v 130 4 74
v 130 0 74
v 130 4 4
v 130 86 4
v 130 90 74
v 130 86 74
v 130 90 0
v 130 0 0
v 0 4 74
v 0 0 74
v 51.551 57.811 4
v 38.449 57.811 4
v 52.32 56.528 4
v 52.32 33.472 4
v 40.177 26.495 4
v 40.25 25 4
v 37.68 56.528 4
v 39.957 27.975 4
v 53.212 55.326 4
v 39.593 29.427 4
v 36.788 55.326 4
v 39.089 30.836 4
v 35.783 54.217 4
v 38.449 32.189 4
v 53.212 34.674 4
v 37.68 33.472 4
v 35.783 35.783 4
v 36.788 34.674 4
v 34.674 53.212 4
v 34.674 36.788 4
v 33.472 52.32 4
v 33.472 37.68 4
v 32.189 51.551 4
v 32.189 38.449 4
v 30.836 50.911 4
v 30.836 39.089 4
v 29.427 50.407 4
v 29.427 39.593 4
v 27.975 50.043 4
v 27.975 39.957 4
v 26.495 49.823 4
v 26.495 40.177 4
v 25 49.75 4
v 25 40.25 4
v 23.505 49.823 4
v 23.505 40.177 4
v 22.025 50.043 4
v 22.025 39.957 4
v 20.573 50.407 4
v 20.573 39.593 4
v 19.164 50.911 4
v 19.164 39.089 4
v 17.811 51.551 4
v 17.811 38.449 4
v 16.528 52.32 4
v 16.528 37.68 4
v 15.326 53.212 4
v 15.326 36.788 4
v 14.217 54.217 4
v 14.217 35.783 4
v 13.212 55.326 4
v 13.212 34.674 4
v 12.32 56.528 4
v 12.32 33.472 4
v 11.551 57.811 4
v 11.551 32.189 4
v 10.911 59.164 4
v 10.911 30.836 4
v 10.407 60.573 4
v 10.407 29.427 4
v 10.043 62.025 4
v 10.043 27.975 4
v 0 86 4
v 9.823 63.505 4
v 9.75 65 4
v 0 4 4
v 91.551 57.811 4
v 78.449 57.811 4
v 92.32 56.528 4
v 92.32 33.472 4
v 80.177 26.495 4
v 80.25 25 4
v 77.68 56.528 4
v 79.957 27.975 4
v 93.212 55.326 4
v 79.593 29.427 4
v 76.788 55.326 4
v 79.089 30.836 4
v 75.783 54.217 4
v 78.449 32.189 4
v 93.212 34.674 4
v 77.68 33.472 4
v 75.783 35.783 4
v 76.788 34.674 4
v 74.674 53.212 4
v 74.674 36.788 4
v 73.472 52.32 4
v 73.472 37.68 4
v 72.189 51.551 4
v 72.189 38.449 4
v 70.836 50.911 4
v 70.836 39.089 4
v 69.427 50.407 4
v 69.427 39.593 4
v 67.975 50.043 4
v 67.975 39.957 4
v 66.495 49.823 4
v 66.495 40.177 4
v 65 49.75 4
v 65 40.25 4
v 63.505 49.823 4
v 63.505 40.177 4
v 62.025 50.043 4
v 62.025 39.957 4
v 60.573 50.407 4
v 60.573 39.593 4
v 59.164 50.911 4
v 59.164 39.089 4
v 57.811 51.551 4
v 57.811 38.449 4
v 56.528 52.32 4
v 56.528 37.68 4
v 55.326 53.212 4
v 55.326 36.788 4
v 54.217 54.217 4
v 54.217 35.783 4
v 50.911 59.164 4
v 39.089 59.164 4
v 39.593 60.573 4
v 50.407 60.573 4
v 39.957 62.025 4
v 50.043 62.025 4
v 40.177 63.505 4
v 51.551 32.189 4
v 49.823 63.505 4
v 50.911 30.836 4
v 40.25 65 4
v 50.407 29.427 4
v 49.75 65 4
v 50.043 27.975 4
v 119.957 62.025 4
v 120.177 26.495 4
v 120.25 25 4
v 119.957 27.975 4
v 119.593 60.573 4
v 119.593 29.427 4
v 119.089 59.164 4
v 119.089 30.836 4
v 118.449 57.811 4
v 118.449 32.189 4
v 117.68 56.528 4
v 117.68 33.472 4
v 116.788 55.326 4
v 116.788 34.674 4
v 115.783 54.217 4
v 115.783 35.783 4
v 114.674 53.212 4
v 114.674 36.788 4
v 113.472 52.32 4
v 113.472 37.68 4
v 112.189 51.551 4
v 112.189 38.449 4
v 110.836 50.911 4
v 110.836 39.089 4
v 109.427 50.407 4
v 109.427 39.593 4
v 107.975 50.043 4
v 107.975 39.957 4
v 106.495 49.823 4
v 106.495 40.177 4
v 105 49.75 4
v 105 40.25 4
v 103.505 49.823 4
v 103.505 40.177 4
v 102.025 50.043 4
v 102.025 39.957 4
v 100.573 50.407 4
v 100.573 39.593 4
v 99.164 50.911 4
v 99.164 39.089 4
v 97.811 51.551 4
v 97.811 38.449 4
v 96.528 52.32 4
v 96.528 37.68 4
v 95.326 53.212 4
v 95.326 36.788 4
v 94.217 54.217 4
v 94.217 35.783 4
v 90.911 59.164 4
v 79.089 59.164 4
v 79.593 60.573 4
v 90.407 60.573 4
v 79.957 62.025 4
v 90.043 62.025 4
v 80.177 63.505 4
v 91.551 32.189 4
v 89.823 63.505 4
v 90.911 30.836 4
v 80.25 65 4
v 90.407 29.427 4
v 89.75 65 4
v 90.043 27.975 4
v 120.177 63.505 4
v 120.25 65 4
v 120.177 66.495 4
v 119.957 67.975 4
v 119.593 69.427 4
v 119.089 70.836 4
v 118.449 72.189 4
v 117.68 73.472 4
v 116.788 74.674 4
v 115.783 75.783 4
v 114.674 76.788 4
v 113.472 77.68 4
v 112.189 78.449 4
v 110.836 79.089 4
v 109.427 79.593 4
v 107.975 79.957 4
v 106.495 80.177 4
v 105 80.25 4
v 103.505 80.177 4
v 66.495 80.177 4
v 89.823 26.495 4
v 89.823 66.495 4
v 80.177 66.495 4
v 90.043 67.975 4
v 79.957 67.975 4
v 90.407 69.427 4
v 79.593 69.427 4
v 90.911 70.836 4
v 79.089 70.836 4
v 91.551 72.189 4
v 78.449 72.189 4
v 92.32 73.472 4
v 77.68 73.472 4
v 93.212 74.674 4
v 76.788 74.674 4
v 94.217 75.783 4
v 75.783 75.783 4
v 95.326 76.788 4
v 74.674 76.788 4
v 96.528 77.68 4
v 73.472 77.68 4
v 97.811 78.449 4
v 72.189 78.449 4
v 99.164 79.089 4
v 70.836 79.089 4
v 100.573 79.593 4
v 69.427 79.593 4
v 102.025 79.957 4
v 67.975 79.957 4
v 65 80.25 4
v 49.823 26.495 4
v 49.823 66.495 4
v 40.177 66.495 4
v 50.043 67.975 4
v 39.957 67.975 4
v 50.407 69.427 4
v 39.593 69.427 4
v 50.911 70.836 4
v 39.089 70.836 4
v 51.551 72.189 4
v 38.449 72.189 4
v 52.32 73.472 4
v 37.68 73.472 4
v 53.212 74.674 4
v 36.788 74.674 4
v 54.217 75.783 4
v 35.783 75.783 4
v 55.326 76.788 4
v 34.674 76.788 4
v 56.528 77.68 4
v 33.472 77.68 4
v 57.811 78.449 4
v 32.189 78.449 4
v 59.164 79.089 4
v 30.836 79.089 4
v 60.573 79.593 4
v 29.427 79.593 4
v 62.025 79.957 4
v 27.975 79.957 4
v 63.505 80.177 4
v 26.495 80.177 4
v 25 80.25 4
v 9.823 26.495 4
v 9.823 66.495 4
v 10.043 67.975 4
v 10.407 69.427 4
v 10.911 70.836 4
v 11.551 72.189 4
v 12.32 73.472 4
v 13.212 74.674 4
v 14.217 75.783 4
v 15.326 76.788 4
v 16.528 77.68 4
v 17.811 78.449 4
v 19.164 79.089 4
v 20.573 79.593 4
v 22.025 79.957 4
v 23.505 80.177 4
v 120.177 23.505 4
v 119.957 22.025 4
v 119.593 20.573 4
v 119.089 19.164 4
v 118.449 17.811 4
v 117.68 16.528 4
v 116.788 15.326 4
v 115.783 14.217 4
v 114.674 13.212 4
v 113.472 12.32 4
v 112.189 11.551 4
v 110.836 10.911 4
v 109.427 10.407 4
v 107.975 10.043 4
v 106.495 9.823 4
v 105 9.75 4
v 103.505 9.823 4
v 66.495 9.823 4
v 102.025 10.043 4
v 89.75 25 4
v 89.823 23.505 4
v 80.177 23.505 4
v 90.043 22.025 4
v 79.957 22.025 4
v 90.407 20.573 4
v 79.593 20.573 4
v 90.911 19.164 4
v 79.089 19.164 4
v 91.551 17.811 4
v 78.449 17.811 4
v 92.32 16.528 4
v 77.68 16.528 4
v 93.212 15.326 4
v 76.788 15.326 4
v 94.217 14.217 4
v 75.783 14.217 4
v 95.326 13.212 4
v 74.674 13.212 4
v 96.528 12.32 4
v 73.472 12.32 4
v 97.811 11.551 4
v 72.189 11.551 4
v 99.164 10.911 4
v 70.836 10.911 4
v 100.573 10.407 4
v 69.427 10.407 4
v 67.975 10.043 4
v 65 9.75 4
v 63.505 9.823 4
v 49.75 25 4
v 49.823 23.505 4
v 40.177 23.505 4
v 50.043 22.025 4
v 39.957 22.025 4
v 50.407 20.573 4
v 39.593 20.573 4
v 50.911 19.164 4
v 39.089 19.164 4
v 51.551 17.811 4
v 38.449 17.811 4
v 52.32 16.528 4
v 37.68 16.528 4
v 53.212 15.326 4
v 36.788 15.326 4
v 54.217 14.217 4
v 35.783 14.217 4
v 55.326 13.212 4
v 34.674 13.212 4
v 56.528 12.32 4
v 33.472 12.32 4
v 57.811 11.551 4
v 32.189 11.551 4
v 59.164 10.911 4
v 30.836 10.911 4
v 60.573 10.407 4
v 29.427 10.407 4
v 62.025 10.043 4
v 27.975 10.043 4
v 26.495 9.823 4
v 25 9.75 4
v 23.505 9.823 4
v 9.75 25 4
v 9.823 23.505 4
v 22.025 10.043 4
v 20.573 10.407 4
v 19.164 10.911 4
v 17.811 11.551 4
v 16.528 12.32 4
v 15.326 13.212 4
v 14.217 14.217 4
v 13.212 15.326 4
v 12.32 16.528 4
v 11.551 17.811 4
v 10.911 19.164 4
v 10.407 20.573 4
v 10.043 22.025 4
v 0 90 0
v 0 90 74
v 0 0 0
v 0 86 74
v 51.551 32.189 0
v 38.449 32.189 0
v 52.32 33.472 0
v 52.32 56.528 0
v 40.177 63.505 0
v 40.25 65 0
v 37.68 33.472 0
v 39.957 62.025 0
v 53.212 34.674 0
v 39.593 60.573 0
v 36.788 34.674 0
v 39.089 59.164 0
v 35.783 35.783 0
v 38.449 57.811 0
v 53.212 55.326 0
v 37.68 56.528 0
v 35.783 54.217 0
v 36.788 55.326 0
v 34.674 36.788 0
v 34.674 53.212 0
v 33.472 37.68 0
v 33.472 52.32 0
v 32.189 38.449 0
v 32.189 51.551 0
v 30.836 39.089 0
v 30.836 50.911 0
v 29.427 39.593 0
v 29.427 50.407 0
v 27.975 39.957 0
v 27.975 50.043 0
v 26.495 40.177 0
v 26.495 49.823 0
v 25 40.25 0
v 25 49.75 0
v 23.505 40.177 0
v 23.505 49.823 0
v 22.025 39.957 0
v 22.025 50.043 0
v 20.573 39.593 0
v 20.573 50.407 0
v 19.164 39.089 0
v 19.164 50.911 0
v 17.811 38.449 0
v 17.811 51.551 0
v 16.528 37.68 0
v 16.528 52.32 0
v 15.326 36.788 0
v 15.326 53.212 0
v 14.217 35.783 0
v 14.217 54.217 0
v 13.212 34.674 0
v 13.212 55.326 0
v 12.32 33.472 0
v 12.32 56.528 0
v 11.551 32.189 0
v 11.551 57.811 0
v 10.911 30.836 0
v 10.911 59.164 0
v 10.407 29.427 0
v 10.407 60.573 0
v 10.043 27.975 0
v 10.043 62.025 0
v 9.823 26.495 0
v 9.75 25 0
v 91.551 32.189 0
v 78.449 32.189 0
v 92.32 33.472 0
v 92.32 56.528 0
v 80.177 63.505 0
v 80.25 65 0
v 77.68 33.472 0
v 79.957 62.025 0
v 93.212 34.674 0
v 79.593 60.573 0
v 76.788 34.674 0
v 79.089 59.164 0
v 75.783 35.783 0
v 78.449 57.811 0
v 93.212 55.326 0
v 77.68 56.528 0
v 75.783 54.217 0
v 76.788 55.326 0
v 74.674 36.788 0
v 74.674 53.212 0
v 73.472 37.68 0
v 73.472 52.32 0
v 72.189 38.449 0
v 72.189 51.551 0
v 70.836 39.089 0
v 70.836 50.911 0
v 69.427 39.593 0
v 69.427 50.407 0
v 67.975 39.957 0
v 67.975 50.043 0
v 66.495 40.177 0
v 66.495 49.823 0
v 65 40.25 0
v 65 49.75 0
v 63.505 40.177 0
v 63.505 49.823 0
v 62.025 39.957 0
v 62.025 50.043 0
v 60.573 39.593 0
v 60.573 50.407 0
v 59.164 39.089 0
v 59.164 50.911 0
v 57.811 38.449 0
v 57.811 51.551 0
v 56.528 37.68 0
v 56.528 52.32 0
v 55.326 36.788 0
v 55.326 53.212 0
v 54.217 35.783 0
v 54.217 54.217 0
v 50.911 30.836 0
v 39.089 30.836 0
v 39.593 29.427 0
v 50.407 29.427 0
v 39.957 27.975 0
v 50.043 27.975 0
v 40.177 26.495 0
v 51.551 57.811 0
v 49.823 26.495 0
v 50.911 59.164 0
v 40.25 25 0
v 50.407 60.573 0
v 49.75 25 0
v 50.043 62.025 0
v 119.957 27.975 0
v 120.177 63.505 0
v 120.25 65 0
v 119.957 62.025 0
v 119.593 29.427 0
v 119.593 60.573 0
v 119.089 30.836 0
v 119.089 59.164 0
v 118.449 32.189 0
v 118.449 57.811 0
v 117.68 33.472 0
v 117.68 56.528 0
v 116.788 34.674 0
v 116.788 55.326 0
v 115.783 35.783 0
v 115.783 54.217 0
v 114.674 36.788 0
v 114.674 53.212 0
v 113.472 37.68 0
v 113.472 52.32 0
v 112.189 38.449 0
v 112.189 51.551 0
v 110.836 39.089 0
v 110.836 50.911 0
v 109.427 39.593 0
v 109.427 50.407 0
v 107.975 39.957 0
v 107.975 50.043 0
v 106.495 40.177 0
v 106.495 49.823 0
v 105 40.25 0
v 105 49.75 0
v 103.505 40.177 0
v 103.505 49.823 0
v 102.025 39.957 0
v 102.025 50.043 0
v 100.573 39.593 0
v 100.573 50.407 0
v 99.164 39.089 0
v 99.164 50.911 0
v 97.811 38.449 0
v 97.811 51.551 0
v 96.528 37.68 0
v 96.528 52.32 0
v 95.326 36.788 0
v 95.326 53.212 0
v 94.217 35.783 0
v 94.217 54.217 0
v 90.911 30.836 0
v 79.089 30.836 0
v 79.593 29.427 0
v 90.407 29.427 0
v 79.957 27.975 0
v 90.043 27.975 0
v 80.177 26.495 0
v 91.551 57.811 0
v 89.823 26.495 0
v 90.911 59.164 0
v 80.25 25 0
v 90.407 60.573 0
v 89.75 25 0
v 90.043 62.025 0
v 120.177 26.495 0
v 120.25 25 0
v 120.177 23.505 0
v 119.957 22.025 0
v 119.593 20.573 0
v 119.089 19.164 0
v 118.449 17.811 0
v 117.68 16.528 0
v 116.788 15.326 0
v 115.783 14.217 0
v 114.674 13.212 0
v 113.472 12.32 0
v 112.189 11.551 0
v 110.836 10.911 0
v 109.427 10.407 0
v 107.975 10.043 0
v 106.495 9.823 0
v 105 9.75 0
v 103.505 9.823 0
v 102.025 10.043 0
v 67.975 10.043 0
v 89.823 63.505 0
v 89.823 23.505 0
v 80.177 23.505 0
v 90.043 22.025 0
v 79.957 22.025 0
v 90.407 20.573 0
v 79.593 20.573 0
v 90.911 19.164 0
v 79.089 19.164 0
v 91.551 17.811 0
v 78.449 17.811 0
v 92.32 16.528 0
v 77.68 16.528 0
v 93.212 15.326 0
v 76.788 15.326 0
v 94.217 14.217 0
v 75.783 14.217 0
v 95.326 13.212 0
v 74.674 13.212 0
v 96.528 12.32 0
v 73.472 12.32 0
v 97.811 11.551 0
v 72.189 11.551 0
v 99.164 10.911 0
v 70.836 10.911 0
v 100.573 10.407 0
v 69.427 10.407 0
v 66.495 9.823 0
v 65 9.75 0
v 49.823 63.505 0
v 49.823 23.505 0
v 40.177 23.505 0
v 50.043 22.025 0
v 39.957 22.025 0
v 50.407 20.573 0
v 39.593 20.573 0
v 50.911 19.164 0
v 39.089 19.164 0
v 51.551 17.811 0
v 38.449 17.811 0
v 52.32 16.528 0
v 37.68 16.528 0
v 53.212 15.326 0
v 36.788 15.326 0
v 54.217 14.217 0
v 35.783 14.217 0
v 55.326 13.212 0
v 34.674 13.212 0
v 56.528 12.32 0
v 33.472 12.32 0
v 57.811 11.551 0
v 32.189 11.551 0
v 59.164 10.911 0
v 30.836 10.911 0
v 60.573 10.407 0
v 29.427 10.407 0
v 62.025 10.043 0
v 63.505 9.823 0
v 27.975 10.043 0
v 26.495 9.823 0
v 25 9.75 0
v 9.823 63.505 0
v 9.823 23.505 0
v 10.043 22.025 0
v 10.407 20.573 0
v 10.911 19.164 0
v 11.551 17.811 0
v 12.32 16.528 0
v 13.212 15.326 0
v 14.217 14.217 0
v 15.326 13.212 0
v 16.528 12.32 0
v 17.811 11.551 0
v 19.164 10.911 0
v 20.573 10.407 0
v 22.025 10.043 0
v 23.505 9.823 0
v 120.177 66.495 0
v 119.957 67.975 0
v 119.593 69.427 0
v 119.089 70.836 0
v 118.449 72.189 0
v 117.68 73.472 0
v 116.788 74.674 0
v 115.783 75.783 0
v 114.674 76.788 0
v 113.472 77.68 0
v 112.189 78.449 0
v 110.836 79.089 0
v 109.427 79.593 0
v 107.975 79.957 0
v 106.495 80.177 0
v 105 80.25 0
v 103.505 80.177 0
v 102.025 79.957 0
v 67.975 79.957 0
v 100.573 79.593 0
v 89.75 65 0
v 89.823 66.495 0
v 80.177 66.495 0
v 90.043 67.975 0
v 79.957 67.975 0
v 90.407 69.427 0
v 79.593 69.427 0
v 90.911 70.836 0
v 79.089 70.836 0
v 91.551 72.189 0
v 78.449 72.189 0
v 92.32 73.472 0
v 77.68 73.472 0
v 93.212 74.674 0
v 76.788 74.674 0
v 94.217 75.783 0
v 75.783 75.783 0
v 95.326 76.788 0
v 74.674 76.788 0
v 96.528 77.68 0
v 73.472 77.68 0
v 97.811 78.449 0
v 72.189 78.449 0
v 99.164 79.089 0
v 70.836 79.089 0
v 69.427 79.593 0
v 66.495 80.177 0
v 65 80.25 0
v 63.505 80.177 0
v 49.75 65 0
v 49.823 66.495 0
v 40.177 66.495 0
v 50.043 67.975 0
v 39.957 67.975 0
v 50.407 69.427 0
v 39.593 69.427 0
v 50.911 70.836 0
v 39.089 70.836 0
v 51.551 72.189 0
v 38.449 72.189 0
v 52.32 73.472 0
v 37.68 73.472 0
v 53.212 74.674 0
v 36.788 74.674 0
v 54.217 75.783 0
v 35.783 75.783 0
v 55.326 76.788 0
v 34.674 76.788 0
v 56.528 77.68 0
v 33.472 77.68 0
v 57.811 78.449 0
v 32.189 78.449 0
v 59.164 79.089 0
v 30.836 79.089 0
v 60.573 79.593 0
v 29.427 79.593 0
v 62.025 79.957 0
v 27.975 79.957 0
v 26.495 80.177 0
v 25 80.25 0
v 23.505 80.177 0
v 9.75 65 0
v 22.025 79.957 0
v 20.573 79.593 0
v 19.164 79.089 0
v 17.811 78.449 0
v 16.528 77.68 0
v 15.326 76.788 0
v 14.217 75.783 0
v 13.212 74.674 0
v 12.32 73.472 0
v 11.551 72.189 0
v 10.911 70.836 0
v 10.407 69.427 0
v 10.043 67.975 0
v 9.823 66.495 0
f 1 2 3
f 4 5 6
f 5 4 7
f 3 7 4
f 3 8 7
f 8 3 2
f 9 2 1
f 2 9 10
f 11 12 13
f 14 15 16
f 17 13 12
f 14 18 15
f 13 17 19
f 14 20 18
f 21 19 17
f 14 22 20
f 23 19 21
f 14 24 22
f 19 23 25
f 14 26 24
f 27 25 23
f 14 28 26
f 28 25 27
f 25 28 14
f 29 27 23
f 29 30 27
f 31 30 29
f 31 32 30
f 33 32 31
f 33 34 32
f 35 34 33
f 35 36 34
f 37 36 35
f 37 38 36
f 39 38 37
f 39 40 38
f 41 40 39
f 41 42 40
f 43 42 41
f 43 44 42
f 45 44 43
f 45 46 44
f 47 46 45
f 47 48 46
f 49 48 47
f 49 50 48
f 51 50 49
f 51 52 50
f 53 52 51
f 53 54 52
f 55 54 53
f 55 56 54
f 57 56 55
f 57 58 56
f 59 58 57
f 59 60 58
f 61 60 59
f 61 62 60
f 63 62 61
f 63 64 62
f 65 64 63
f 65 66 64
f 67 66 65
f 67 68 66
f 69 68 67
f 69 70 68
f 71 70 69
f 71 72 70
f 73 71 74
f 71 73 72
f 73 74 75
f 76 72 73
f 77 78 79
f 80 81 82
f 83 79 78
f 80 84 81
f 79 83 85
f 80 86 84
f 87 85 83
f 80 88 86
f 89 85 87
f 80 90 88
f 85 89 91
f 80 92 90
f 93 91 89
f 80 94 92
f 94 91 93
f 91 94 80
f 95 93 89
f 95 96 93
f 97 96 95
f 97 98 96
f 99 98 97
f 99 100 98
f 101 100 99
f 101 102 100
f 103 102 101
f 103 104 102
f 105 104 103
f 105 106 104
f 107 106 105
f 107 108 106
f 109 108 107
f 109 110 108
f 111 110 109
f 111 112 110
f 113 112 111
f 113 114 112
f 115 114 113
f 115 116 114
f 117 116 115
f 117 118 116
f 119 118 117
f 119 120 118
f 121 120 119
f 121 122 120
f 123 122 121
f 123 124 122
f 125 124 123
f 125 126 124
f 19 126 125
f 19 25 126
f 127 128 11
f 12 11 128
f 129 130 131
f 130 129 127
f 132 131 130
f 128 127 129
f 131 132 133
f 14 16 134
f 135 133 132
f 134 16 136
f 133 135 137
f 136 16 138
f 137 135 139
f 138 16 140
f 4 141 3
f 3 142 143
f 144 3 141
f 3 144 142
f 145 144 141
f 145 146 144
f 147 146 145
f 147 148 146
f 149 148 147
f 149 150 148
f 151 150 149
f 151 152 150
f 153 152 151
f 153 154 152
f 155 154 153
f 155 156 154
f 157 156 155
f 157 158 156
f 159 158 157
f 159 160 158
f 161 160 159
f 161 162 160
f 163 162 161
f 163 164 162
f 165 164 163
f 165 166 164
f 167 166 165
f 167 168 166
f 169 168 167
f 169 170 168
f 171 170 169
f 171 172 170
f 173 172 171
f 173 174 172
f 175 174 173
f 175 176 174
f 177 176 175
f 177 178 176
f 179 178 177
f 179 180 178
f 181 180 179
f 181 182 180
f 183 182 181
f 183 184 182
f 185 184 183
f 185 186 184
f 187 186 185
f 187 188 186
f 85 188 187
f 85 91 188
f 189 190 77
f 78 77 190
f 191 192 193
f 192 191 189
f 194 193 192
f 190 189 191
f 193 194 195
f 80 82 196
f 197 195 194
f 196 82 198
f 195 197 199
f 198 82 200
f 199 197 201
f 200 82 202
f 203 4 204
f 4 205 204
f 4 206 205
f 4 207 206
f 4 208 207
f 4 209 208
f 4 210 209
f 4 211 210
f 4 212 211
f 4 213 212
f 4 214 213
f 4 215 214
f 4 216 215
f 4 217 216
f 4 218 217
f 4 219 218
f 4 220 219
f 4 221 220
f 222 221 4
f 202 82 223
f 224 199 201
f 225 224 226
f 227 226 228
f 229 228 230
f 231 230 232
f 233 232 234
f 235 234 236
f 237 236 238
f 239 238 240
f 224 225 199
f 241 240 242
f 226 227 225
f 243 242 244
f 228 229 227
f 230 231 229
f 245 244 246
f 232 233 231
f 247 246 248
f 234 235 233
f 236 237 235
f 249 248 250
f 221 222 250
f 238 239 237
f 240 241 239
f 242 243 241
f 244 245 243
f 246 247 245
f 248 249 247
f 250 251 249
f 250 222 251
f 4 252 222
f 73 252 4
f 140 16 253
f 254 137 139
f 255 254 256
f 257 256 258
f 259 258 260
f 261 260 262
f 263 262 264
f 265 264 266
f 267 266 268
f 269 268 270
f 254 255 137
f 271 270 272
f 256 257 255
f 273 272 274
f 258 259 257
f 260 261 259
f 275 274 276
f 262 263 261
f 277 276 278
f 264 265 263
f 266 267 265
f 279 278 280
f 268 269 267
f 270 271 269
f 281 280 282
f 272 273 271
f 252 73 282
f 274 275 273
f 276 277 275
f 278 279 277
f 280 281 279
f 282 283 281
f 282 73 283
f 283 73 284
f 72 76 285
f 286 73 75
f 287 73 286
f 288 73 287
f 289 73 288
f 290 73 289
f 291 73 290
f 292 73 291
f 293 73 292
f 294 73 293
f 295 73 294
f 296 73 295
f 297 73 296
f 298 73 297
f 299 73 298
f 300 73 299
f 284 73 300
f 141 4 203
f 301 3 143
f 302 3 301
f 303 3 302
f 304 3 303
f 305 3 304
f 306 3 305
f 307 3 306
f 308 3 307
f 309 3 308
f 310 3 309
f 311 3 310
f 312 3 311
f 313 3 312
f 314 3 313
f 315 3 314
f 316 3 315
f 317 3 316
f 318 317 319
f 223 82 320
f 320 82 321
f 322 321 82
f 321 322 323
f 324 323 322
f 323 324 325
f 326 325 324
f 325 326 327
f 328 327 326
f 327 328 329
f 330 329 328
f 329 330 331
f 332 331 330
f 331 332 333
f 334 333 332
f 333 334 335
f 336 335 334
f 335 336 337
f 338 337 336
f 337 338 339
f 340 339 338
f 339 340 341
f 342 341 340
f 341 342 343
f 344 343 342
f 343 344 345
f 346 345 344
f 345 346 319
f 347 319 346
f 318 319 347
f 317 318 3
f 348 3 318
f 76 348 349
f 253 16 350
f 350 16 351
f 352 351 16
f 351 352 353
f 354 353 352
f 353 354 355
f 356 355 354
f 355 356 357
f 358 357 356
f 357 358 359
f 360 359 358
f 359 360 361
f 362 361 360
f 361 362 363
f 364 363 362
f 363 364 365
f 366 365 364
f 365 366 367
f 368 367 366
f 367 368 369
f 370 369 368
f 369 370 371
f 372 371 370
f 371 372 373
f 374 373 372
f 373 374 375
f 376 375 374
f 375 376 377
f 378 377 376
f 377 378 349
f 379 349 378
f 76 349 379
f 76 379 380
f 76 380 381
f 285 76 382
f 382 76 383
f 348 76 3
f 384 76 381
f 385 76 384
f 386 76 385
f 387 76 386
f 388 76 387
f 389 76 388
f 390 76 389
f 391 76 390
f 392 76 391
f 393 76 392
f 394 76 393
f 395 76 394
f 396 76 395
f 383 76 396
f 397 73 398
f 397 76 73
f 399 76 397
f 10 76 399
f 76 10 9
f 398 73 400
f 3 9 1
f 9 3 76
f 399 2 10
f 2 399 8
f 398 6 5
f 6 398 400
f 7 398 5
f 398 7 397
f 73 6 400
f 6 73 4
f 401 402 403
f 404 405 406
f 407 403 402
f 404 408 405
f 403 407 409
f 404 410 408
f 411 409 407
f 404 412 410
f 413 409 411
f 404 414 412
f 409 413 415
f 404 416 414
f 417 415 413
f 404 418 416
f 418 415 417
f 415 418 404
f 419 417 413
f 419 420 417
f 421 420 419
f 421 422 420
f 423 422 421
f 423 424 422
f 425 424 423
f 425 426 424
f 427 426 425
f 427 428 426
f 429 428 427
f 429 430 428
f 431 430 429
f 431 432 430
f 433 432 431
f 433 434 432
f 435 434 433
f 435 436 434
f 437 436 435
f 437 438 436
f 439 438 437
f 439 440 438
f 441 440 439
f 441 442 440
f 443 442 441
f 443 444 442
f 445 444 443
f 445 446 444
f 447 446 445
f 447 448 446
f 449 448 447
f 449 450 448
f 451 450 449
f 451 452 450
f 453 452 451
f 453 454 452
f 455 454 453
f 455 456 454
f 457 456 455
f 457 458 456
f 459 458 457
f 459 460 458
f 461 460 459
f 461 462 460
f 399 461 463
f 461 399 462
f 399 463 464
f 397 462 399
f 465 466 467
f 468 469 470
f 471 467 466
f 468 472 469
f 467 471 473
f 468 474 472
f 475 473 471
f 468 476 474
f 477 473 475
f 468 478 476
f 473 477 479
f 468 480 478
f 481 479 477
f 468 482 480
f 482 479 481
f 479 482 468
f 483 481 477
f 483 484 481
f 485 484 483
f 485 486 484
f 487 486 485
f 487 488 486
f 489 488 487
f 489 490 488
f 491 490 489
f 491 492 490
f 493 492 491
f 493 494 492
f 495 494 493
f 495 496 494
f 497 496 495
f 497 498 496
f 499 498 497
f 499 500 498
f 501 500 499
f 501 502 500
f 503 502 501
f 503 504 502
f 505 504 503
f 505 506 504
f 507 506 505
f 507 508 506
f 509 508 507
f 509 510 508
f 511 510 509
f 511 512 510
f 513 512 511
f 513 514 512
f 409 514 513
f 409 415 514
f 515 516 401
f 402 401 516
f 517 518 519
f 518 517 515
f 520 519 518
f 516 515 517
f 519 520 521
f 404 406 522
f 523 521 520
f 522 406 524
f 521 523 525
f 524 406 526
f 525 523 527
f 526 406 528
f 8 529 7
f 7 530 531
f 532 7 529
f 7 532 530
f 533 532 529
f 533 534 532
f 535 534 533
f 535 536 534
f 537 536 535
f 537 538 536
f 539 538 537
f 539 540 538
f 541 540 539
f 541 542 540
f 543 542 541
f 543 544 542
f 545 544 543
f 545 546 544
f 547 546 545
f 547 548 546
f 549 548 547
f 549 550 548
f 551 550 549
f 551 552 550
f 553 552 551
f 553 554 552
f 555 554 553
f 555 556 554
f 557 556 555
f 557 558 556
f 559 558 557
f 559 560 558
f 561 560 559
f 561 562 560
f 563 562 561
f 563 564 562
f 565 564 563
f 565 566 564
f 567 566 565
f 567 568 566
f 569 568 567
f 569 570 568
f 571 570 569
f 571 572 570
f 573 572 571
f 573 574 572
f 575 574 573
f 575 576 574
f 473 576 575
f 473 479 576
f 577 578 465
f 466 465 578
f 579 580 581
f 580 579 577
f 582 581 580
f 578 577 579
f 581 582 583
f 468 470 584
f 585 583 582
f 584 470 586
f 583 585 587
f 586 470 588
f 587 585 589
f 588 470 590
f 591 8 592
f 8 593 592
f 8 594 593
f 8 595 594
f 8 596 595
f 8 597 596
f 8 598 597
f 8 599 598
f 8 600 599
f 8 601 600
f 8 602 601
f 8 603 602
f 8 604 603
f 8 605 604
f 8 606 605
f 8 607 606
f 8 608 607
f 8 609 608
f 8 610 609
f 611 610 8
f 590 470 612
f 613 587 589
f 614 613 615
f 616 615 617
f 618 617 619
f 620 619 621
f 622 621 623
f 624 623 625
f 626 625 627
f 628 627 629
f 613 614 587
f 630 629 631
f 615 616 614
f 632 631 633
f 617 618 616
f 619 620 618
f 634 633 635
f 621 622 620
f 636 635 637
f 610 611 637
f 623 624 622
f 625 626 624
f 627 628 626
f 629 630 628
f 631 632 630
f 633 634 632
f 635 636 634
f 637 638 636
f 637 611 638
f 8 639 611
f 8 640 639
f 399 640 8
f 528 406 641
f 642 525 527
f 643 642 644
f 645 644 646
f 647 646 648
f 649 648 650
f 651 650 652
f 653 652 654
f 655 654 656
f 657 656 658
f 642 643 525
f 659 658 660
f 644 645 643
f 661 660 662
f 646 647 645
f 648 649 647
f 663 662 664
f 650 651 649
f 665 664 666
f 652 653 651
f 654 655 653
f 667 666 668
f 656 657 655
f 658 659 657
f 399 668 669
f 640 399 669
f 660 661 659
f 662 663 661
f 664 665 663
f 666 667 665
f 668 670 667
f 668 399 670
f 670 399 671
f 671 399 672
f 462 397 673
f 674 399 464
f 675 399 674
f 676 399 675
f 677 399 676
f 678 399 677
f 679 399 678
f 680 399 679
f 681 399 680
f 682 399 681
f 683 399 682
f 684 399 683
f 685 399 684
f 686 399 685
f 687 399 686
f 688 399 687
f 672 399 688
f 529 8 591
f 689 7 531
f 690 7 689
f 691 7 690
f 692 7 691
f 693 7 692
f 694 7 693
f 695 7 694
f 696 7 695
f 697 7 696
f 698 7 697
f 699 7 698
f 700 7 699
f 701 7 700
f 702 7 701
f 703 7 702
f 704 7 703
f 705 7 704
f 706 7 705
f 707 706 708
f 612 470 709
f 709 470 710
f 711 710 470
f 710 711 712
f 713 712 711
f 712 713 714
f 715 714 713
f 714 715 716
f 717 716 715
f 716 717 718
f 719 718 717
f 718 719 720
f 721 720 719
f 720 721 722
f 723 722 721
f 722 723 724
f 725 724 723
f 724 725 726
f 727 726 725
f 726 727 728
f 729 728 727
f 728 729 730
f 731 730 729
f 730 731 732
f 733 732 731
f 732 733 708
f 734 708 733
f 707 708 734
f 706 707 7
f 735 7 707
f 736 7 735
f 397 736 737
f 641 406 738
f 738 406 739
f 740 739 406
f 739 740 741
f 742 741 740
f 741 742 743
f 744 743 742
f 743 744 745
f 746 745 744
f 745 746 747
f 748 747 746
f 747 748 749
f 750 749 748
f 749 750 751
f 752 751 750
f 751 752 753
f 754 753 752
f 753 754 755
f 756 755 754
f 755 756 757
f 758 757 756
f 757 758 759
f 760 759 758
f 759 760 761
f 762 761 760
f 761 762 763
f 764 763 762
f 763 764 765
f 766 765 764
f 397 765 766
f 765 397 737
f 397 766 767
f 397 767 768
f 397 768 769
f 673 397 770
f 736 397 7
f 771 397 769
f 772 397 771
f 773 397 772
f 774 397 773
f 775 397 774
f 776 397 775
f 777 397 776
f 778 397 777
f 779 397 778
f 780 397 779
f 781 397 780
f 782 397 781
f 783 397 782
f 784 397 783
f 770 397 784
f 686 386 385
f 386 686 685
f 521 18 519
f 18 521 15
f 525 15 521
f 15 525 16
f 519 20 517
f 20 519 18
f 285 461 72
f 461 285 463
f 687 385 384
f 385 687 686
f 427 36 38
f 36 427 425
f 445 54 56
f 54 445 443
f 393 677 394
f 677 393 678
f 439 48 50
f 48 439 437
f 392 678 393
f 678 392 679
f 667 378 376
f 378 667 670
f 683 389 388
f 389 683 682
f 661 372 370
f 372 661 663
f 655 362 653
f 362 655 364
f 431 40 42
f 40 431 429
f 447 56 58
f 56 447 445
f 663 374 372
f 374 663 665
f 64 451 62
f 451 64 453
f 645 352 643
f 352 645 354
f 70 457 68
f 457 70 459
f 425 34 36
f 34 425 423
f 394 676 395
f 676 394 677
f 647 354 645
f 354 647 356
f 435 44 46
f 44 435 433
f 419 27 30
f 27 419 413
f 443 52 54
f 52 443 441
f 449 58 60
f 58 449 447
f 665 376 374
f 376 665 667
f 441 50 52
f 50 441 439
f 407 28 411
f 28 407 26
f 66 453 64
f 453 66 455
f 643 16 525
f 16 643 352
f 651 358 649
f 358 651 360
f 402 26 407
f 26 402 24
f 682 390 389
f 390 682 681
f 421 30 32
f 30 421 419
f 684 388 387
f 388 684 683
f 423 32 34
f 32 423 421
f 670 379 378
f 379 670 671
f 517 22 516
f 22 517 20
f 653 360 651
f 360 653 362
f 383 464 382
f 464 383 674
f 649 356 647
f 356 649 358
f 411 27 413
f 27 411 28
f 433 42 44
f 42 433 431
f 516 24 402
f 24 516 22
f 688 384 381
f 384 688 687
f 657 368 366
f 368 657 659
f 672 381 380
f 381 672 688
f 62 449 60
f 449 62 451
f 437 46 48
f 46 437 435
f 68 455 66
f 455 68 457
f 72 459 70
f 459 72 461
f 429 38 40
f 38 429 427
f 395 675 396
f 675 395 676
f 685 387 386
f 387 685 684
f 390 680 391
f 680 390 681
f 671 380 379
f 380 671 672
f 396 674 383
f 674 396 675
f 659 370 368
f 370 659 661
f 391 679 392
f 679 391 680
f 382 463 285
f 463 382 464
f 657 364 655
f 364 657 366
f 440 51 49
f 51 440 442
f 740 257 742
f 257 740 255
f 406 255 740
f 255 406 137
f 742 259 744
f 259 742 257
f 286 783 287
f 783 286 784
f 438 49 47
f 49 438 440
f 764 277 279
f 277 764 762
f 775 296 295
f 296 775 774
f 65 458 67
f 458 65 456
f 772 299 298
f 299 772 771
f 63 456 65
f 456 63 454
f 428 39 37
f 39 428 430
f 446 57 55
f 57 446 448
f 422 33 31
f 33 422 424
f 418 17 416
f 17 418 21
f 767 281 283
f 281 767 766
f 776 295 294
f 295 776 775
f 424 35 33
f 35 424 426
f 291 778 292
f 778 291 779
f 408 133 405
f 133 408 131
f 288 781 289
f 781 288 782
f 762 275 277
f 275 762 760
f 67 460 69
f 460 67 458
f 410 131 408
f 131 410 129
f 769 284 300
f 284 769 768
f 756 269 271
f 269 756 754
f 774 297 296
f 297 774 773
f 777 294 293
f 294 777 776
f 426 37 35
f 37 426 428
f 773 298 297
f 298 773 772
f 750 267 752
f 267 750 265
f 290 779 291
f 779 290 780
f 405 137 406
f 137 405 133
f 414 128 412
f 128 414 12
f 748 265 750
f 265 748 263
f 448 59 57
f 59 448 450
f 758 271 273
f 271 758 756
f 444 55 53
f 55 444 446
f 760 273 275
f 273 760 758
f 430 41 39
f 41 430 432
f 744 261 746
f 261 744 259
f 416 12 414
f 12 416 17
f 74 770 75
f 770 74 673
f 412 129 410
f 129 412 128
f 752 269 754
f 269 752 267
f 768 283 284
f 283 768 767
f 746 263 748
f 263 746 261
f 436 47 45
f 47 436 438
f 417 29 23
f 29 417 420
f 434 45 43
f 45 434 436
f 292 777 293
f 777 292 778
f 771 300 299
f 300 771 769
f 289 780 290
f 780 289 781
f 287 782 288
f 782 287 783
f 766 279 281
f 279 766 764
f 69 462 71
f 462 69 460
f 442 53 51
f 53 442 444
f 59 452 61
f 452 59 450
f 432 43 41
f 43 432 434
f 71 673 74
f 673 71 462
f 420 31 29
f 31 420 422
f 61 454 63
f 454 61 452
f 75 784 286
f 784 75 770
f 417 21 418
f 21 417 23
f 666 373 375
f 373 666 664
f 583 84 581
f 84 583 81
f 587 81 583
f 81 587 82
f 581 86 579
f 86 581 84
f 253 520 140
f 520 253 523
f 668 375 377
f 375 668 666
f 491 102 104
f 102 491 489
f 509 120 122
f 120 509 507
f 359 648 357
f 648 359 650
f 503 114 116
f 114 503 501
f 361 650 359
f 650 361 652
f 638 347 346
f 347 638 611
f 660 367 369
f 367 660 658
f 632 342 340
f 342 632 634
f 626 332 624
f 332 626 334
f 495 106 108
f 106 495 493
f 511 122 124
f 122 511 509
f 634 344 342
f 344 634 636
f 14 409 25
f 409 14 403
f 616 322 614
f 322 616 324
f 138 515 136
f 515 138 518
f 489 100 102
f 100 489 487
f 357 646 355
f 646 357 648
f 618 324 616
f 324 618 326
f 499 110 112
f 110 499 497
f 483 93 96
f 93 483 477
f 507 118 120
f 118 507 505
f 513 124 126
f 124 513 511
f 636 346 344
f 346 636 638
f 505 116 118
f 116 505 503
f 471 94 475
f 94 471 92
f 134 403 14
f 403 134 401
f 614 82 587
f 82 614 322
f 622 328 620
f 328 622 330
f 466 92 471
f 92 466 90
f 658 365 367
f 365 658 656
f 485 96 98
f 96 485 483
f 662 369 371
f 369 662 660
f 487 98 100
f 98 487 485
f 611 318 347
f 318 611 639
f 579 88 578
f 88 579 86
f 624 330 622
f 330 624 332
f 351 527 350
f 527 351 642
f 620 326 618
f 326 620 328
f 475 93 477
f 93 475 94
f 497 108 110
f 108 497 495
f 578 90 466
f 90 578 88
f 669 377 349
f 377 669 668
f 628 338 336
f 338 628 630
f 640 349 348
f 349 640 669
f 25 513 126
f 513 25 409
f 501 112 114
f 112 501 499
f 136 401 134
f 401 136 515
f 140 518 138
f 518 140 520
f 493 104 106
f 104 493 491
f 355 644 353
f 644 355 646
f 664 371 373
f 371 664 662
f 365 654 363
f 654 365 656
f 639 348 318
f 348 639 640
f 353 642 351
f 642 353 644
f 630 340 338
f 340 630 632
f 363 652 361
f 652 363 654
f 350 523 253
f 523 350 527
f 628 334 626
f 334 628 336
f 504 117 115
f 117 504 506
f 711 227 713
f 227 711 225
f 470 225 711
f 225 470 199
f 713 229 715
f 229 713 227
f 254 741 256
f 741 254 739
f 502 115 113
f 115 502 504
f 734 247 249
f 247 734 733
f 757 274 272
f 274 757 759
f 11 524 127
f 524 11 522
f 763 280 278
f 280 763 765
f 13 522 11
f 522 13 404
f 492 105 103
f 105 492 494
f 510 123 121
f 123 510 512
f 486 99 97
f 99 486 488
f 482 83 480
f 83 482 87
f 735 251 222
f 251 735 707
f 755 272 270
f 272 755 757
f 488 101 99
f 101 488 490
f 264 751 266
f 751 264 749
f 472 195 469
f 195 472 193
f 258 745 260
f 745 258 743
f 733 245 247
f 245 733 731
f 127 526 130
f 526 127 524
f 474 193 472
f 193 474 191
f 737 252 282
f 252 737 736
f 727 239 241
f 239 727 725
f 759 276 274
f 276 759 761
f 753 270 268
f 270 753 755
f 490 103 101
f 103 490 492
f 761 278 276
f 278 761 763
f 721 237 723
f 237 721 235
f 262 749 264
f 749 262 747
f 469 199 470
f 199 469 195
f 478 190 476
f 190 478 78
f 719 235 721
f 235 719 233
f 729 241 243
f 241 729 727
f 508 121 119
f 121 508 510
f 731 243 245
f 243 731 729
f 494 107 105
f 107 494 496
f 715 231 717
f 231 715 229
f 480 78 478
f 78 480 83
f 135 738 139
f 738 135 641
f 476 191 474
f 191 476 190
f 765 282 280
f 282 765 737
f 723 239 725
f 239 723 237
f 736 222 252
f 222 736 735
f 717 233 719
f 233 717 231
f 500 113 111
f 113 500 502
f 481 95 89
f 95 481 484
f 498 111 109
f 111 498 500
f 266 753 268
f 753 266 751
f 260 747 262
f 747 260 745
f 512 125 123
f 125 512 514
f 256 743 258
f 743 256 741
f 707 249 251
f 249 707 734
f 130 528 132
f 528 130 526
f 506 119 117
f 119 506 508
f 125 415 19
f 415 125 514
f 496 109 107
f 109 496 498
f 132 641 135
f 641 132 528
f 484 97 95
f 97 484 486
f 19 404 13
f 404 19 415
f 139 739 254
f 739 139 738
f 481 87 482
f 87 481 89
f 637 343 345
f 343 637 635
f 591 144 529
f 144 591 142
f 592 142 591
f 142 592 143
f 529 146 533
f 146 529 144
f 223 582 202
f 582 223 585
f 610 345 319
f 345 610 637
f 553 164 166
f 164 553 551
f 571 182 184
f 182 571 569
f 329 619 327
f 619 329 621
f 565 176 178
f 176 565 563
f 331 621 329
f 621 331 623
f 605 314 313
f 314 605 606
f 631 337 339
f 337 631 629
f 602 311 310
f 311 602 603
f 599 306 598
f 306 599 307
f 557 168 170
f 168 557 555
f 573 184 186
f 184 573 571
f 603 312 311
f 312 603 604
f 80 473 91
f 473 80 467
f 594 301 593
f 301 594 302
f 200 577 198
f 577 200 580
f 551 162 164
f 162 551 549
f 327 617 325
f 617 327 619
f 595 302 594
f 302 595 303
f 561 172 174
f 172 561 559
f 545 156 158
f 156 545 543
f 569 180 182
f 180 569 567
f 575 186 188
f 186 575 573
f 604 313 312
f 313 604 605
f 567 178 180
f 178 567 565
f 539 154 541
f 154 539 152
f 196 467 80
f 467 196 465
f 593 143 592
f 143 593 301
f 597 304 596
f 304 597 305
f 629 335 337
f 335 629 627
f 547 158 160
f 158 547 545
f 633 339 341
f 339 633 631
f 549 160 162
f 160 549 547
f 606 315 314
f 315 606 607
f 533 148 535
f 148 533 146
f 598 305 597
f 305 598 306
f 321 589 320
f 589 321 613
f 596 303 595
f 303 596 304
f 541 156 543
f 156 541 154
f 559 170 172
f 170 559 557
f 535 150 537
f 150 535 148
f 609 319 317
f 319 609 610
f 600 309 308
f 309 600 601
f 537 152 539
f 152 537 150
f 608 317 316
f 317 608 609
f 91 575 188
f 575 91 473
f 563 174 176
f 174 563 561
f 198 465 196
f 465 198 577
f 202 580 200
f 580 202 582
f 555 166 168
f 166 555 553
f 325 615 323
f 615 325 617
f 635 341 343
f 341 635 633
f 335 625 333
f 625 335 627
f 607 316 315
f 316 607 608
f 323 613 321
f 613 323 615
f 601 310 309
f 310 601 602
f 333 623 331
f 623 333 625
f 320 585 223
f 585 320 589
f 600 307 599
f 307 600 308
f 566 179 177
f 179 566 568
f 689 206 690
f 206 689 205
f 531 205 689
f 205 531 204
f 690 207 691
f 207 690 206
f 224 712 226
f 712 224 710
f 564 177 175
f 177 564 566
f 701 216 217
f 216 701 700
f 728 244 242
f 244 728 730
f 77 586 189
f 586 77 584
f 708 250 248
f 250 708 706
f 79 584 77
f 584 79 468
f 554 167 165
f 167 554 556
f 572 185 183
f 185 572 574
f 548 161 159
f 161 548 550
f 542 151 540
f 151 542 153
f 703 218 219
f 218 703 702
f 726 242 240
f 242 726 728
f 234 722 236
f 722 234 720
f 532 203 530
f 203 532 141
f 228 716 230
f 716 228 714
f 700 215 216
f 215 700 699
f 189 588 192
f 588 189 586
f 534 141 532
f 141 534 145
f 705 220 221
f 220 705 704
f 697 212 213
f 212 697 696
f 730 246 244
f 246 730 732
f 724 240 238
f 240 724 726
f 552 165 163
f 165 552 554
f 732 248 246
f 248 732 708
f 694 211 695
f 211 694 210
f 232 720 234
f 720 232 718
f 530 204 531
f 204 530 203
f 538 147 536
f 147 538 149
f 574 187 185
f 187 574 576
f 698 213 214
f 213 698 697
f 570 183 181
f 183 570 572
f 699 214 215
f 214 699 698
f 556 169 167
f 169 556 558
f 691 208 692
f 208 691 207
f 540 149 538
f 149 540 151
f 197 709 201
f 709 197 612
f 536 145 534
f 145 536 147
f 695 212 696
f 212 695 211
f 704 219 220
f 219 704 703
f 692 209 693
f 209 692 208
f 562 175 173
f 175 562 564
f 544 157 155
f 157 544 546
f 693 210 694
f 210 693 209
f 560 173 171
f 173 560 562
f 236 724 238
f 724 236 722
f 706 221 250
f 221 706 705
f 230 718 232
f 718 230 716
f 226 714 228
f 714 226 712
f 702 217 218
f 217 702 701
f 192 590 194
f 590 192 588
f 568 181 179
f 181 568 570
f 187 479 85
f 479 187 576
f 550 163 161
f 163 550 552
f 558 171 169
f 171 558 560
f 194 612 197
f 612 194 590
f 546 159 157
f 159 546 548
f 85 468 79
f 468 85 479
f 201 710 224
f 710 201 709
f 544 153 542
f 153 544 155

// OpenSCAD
// Rack for six 50 mL conical (Falcon-type) tubes
// Printed upside down and flipped over after printing

$fn = 64;

// Plate dimensions
plate_length = 130; // X direction
plate_width  = 90;  // Y direction
plate_thick  = 4;   // Z direction

// Hole pattern
hole_dia = 30.5;
hole_pitch_x = 40; // X direction spacing
hole_pitch_y = 40; // Y direction spacing
num_holes_x = 3;
num_holes_y = 2;

// Wall dimensions
wall_thick = 4;
wall_height = 70;

// Calculate hole positions (centred on plate)
plate_centre_x = plate_length / 2;
plate_centre_y = plate_width / 2;

// Total span of holes
holes_span_x = (num_holes_x - 1) * hole_pitch_x;
holes_span_y = (num_holes_y - 1) * hole_pitch_y;

// Offset from plate centre to first hole
offset_x = (holes_span_x) / 2;
offset_y = (holes_span_y) / 2;

// Plate
module plate() {
    translate([0, 0, 0])
        cube([plate_length, plate_width, plate_thick]);
}

// Holes
module holes() {
    for (i = [0 : num_holes_x - 1]) {
        for (j = [0 : num_holes_y - 1]) {
            x = plate_centre_x - offset_x + i * hole_pitch_x;
            y = plate_centre_y - offset_y + j * hole_pitch_y;
            translate([x, y, -1])
                cylinder(d = hole_dia, h = plate_thick + 2);
        }
    }
}

// Walls (along long edges, i.e., along X-axis at Y = 0 and Y = plate_width)
module walls() {
    // Front wall (Y = 0)
    translate([0, 0, plate_thick])
        cube([plate_length, wall_thick, wall_height]);
    
    // Back wall (Y = plate_width - wall_thick)
    translate([0, plate_width - wall_thick, plate_thick])
        cube([plate_length, wall_thick, wall_height]);
}

// Build the rack
difference() {
    union() {
        plate();
        walls();
    }
    holes();
}
